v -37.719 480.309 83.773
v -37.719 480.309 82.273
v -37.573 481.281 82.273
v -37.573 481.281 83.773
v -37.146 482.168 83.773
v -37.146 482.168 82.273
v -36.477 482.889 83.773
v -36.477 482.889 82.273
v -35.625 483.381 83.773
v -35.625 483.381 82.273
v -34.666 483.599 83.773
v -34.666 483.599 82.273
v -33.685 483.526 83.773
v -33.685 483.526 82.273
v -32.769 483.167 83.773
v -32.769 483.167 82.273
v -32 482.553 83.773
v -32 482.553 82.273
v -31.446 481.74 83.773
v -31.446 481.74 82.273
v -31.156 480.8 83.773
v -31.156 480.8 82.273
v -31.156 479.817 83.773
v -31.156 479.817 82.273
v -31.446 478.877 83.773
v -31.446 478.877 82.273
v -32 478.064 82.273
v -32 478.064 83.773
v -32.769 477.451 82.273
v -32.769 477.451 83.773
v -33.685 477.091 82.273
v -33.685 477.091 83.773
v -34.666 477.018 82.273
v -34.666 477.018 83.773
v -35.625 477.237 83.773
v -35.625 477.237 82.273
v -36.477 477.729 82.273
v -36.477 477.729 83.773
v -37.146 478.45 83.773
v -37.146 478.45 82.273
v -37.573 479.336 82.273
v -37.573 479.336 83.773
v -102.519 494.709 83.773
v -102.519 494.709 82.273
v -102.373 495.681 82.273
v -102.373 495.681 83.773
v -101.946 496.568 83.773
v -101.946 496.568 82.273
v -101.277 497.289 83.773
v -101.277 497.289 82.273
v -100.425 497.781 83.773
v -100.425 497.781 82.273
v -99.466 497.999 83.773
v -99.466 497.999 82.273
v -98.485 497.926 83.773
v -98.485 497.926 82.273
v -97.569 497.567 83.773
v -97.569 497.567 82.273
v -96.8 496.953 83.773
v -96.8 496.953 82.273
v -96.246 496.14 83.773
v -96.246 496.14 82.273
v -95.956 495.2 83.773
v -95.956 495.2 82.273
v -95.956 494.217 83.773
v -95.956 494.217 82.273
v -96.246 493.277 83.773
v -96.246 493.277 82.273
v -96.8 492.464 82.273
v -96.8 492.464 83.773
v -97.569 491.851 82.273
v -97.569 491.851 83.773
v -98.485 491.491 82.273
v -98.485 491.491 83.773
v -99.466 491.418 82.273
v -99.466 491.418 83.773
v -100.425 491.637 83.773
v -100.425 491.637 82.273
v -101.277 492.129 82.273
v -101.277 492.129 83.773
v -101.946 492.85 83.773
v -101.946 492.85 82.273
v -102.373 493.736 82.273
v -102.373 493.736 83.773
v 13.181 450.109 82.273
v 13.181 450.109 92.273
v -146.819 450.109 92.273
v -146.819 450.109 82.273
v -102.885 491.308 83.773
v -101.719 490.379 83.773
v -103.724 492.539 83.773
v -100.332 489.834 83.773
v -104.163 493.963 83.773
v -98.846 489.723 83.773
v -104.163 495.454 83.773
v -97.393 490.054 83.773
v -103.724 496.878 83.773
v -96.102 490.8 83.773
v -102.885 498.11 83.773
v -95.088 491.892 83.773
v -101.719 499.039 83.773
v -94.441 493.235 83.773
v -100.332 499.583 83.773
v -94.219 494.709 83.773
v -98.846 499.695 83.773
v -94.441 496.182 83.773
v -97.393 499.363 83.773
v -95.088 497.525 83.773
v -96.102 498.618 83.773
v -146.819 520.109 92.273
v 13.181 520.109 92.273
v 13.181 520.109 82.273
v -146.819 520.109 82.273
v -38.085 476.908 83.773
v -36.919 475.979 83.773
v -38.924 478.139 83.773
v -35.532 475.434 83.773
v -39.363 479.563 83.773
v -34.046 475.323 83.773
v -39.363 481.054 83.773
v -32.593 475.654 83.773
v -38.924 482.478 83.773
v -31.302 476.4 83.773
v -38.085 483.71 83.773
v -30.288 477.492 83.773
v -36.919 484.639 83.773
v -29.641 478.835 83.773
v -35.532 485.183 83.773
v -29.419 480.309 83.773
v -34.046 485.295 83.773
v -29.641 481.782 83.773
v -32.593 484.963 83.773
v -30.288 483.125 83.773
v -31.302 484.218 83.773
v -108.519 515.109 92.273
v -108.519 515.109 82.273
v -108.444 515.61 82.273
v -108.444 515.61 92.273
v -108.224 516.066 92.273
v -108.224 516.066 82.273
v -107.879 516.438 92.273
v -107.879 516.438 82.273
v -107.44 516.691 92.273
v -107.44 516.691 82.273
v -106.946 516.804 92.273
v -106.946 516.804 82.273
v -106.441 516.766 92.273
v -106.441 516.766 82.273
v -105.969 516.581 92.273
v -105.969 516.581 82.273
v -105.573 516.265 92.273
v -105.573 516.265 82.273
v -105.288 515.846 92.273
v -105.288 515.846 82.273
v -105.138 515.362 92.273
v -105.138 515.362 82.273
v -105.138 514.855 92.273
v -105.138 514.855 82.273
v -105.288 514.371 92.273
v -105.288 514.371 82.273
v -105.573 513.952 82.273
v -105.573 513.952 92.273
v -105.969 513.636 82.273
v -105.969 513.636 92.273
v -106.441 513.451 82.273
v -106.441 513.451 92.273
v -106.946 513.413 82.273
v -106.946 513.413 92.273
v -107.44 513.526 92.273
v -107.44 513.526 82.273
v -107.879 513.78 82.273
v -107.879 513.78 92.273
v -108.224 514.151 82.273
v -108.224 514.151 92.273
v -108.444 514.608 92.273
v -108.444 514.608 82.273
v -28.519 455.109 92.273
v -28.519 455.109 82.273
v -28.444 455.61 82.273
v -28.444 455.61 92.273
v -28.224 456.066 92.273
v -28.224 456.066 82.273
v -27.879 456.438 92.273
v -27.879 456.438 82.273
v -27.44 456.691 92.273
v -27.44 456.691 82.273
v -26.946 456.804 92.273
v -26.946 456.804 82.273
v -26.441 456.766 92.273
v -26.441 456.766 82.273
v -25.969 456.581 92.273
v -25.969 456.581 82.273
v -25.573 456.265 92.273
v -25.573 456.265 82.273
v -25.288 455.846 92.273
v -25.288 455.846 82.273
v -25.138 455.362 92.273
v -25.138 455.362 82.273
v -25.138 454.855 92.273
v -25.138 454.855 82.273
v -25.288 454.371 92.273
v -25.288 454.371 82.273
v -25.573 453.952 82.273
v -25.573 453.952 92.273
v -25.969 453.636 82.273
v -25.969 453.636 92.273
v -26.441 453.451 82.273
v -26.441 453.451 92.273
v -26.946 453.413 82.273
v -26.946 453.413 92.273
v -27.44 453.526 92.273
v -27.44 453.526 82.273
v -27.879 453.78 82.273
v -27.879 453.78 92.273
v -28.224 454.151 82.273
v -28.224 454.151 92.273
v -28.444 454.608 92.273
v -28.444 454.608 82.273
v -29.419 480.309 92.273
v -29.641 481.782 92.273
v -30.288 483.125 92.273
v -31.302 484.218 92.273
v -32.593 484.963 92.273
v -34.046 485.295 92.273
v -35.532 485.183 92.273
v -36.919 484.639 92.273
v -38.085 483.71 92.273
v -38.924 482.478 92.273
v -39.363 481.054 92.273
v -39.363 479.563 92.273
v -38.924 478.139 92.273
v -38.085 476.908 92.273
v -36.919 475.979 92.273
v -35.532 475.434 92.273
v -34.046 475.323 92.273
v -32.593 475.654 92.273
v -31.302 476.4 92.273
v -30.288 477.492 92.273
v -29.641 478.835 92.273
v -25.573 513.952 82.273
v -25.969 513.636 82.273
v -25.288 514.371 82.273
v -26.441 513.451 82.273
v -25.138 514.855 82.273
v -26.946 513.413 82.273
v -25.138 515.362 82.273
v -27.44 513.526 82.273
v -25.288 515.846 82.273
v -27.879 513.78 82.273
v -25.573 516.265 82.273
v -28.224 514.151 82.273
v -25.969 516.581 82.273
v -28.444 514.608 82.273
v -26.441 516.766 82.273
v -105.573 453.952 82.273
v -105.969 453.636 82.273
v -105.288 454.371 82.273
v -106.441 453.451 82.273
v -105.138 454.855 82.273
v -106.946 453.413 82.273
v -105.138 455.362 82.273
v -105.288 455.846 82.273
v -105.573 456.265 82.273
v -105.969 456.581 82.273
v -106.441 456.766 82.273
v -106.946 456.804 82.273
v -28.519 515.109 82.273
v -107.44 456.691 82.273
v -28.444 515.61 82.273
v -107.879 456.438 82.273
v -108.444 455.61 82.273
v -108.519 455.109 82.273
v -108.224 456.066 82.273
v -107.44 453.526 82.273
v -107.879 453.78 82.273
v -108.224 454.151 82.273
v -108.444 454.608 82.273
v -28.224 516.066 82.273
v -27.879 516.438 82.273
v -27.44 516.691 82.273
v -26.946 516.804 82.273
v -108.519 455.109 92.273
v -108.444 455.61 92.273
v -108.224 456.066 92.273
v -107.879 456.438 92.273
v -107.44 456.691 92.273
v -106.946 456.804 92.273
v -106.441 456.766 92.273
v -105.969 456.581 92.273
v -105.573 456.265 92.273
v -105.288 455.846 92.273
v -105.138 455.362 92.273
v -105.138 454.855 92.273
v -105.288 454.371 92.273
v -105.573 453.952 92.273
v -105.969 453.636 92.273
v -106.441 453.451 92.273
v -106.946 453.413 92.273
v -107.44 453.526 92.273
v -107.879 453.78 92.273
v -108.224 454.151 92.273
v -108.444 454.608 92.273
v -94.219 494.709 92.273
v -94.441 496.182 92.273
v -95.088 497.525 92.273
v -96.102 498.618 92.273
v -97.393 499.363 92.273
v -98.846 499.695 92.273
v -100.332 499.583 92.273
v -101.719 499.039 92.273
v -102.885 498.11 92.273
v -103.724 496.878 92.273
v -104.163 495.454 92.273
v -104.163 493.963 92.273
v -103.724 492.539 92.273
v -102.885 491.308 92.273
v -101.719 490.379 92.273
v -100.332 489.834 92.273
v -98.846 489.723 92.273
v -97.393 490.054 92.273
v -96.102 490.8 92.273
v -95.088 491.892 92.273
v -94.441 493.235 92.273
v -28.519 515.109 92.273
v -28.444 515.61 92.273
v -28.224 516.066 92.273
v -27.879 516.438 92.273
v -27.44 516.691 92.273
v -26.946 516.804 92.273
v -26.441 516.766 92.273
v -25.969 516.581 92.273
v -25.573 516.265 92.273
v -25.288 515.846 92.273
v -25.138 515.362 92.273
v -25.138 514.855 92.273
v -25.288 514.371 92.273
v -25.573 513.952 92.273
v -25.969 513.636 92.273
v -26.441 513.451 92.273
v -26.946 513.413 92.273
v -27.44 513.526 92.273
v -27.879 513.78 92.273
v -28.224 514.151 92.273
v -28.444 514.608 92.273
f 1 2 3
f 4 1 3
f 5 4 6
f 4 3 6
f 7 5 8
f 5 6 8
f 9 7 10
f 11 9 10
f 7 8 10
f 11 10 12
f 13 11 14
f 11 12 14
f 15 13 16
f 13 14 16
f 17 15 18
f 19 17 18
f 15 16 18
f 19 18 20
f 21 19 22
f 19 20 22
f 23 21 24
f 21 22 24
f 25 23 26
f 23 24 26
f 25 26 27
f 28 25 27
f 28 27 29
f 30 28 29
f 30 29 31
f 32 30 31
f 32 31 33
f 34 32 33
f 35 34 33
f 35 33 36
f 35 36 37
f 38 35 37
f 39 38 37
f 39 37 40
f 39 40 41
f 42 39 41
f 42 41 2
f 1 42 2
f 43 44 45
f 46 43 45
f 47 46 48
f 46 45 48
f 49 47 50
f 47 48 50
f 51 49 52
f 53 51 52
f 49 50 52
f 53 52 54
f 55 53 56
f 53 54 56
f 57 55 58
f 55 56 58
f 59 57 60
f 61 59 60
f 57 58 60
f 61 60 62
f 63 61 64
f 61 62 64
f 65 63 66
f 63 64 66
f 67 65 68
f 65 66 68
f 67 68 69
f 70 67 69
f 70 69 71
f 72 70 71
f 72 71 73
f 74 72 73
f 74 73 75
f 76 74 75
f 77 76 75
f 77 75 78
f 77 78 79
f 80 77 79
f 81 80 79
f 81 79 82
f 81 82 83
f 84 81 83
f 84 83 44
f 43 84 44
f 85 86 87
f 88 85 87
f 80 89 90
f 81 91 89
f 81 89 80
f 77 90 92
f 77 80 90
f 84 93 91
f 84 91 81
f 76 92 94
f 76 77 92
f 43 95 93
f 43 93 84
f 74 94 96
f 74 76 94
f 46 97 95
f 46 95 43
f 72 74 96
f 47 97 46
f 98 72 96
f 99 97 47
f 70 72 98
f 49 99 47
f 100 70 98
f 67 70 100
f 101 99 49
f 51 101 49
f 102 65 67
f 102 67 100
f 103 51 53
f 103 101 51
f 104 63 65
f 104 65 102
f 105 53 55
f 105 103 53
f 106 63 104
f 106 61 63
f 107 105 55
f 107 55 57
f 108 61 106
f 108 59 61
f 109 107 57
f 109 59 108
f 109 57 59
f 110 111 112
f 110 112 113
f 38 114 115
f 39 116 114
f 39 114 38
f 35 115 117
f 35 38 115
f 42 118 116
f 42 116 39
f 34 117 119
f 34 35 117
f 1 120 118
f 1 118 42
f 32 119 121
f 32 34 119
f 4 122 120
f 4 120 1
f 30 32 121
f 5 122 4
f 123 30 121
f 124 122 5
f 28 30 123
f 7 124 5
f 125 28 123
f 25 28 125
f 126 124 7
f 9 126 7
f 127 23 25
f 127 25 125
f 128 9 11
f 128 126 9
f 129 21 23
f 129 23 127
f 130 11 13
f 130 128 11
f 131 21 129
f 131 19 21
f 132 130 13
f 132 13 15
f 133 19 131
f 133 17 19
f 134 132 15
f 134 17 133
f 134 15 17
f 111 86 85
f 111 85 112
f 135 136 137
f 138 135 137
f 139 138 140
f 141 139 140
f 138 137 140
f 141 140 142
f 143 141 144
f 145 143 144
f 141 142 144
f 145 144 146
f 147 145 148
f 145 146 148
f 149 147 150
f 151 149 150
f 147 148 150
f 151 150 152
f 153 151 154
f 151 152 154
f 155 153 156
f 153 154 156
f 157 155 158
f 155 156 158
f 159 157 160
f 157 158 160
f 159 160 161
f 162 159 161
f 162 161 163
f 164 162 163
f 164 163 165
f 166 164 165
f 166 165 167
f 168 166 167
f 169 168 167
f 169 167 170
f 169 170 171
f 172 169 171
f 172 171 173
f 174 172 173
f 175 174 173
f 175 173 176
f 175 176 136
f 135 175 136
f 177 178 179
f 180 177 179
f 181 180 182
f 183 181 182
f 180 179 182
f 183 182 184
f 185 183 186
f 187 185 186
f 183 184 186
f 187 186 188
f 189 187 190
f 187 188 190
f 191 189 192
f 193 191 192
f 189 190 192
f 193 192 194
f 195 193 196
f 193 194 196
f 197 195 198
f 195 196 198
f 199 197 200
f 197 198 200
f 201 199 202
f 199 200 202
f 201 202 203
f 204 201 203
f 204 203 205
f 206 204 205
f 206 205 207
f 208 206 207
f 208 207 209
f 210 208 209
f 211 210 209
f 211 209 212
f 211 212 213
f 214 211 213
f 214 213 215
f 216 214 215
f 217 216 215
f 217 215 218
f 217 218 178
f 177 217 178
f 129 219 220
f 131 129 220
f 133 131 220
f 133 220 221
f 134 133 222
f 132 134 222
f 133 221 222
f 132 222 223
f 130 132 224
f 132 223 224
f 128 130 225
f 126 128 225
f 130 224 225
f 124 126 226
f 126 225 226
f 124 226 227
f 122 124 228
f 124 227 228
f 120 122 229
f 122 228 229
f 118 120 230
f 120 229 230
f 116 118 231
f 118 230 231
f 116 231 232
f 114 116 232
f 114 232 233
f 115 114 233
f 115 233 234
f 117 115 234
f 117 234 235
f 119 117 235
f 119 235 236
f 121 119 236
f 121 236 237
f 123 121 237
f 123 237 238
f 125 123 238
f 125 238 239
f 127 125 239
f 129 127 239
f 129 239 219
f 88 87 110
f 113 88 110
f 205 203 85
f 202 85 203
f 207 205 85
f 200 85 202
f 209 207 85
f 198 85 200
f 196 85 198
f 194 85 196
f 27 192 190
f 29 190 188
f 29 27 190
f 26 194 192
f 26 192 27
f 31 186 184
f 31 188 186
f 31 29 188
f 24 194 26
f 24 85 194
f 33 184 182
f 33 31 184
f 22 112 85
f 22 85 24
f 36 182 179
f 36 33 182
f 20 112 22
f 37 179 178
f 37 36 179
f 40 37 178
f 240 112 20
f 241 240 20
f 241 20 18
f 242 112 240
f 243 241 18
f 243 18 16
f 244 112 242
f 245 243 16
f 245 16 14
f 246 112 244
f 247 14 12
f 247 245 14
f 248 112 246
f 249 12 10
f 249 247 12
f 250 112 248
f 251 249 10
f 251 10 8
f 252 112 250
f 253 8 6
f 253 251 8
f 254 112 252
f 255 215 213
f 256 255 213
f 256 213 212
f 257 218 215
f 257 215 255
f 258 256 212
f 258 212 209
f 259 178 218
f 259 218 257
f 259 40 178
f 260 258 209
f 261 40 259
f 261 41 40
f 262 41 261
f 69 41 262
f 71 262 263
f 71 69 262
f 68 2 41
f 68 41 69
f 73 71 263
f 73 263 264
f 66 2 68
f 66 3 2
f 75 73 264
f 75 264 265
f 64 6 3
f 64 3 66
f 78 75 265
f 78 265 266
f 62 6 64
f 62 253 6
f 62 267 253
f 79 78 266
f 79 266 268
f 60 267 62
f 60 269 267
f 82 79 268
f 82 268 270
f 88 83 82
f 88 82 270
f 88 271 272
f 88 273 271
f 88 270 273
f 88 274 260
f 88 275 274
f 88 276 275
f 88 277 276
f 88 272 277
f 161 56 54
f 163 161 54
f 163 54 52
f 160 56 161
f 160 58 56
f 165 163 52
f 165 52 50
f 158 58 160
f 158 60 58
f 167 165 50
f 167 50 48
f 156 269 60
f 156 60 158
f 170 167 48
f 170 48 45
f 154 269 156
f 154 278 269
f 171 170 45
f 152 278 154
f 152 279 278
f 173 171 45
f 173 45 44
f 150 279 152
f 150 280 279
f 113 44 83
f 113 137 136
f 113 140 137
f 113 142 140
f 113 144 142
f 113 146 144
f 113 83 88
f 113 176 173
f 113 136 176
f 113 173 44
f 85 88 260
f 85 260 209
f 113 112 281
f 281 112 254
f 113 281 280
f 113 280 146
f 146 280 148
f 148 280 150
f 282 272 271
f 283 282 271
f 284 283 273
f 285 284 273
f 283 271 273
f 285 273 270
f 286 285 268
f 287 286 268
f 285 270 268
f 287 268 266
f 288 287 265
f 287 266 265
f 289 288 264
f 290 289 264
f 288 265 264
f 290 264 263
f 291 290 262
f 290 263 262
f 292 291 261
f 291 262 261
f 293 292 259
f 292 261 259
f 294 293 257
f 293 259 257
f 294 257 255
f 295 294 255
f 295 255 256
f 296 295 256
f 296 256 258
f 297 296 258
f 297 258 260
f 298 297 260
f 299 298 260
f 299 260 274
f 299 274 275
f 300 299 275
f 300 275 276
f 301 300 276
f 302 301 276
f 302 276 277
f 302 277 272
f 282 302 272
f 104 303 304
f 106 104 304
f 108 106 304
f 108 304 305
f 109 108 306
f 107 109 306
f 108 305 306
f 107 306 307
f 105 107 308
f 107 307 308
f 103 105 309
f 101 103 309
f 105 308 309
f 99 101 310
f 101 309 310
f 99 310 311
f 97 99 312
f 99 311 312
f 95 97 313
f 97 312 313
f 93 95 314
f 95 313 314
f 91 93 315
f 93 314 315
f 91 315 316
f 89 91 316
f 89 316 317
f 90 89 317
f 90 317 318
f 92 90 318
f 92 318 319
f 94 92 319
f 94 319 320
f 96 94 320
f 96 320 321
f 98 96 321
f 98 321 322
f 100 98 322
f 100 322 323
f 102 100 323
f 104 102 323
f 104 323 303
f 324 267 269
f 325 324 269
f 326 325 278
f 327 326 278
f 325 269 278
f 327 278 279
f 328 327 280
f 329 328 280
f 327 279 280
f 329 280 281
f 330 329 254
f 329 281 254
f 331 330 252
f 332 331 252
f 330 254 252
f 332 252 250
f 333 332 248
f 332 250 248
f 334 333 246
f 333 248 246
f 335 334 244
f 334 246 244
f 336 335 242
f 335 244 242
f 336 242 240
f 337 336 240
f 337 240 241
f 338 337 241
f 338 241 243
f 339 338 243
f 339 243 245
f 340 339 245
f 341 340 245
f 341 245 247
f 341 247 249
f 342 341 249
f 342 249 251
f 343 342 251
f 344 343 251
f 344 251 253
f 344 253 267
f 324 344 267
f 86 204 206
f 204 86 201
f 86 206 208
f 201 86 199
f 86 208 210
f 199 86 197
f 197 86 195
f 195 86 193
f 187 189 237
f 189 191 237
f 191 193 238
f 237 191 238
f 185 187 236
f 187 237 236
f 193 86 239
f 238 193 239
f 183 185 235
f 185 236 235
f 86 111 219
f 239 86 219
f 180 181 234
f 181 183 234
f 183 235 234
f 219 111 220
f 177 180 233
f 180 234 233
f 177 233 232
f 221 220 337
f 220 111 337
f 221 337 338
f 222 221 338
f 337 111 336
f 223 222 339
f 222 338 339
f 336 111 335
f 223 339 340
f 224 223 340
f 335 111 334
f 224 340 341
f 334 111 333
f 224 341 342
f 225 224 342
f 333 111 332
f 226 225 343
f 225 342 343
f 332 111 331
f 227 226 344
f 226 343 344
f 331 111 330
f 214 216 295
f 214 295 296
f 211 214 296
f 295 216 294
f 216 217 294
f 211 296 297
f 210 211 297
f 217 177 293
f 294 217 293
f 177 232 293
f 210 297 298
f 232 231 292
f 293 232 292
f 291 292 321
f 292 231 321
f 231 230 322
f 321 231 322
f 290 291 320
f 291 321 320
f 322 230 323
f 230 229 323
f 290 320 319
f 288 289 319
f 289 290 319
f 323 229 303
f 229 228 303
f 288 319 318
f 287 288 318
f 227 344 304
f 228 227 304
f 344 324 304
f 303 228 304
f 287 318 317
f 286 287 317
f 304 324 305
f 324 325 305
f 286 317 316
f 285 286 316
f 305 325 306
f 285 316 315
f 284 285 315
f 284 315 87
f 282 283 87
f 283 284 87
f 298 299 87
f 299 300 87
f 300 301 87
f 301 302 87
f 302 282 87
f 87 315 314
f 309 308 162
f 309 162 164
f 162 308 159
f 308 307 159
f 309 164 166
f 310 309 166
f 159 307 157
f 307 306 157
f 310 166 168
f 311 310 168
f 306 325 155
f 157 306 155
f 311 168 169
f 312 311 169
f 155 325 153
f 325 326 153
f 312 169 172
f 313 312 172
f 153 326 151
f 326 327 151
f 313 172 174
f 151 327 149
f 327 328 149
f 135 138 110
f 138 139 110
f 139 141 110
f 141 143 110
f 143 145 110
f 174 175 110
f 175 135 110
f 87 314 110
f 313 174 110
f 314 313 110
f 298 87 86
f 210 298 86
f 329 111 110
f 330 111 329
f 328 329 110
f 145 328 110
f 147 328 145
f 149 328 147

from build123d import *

# Parameters (mm, degrees)
ESBO_O1_W                = 160
ESBO_O1_H                = 70
RESSALTO_EXTRUS_O1_DEPTH = 10
FURO_COM_FOLGA_DE_M33_D  = 3.4
ESBO_O6_R                = 5
CORTE_EXTRUS_O1_DEPTH    = 10
FURO_COM_FOLGA_DE_M61_D  = 6.6


with BuildPart() as part:
    # Esboço1 → Ressalto-extrusão1 (new body)
    with BuildSketch(Plane(origin=(0, 0, 92.2731107), x_dir=(-1, 0, 0), z_dir=(0, 0, -1))):
        with Locations((66.819307324, 485.108658775)):
            Rectangle(ESBO_O1_W, ESBO_O1_H)
    extrude(amount=RESSALTO_EXTRUS_O1_DEPTH)

    # Furo com folga de M33 (through all)
    with Locations(Plane.XY.offset(92.2731107)):
        with Locations((-106.819307324, 515.108658775), (-26.819307324, 515.108658775), (-26.819307324, 455.108658775), (-106.819307324, 455.108658775)):
            Hole(FURO_COM_FOLGA_DE_M33_D / 2)

    # Esboço6 → Corte-extrusão1 (cut)
    with BuildSketch(Plane.XY.offset(93.7731107)):
        with Locations((-34.419307324, 480.308658775)):
            Circle(ESBO_O6_R)
        with Locations((-99.219307324, 494.708658775)):
            Circle(ESBO_O6_R)
    extrude(amount=-CORTE_EXTRUS_O1_DEPTH, mode=Mode.SUBTRACT)

    # Furo com folga de M61 (through all)
    with Locations(Plane.XY.offset(83.7731107)):
        with Locations((-99.219307324, 494.708658775), (-34.419307324, 480.308658775)):
            Hole(FURO_COM_FOLGA_DE_M61_D / 2)


solid = part.part
